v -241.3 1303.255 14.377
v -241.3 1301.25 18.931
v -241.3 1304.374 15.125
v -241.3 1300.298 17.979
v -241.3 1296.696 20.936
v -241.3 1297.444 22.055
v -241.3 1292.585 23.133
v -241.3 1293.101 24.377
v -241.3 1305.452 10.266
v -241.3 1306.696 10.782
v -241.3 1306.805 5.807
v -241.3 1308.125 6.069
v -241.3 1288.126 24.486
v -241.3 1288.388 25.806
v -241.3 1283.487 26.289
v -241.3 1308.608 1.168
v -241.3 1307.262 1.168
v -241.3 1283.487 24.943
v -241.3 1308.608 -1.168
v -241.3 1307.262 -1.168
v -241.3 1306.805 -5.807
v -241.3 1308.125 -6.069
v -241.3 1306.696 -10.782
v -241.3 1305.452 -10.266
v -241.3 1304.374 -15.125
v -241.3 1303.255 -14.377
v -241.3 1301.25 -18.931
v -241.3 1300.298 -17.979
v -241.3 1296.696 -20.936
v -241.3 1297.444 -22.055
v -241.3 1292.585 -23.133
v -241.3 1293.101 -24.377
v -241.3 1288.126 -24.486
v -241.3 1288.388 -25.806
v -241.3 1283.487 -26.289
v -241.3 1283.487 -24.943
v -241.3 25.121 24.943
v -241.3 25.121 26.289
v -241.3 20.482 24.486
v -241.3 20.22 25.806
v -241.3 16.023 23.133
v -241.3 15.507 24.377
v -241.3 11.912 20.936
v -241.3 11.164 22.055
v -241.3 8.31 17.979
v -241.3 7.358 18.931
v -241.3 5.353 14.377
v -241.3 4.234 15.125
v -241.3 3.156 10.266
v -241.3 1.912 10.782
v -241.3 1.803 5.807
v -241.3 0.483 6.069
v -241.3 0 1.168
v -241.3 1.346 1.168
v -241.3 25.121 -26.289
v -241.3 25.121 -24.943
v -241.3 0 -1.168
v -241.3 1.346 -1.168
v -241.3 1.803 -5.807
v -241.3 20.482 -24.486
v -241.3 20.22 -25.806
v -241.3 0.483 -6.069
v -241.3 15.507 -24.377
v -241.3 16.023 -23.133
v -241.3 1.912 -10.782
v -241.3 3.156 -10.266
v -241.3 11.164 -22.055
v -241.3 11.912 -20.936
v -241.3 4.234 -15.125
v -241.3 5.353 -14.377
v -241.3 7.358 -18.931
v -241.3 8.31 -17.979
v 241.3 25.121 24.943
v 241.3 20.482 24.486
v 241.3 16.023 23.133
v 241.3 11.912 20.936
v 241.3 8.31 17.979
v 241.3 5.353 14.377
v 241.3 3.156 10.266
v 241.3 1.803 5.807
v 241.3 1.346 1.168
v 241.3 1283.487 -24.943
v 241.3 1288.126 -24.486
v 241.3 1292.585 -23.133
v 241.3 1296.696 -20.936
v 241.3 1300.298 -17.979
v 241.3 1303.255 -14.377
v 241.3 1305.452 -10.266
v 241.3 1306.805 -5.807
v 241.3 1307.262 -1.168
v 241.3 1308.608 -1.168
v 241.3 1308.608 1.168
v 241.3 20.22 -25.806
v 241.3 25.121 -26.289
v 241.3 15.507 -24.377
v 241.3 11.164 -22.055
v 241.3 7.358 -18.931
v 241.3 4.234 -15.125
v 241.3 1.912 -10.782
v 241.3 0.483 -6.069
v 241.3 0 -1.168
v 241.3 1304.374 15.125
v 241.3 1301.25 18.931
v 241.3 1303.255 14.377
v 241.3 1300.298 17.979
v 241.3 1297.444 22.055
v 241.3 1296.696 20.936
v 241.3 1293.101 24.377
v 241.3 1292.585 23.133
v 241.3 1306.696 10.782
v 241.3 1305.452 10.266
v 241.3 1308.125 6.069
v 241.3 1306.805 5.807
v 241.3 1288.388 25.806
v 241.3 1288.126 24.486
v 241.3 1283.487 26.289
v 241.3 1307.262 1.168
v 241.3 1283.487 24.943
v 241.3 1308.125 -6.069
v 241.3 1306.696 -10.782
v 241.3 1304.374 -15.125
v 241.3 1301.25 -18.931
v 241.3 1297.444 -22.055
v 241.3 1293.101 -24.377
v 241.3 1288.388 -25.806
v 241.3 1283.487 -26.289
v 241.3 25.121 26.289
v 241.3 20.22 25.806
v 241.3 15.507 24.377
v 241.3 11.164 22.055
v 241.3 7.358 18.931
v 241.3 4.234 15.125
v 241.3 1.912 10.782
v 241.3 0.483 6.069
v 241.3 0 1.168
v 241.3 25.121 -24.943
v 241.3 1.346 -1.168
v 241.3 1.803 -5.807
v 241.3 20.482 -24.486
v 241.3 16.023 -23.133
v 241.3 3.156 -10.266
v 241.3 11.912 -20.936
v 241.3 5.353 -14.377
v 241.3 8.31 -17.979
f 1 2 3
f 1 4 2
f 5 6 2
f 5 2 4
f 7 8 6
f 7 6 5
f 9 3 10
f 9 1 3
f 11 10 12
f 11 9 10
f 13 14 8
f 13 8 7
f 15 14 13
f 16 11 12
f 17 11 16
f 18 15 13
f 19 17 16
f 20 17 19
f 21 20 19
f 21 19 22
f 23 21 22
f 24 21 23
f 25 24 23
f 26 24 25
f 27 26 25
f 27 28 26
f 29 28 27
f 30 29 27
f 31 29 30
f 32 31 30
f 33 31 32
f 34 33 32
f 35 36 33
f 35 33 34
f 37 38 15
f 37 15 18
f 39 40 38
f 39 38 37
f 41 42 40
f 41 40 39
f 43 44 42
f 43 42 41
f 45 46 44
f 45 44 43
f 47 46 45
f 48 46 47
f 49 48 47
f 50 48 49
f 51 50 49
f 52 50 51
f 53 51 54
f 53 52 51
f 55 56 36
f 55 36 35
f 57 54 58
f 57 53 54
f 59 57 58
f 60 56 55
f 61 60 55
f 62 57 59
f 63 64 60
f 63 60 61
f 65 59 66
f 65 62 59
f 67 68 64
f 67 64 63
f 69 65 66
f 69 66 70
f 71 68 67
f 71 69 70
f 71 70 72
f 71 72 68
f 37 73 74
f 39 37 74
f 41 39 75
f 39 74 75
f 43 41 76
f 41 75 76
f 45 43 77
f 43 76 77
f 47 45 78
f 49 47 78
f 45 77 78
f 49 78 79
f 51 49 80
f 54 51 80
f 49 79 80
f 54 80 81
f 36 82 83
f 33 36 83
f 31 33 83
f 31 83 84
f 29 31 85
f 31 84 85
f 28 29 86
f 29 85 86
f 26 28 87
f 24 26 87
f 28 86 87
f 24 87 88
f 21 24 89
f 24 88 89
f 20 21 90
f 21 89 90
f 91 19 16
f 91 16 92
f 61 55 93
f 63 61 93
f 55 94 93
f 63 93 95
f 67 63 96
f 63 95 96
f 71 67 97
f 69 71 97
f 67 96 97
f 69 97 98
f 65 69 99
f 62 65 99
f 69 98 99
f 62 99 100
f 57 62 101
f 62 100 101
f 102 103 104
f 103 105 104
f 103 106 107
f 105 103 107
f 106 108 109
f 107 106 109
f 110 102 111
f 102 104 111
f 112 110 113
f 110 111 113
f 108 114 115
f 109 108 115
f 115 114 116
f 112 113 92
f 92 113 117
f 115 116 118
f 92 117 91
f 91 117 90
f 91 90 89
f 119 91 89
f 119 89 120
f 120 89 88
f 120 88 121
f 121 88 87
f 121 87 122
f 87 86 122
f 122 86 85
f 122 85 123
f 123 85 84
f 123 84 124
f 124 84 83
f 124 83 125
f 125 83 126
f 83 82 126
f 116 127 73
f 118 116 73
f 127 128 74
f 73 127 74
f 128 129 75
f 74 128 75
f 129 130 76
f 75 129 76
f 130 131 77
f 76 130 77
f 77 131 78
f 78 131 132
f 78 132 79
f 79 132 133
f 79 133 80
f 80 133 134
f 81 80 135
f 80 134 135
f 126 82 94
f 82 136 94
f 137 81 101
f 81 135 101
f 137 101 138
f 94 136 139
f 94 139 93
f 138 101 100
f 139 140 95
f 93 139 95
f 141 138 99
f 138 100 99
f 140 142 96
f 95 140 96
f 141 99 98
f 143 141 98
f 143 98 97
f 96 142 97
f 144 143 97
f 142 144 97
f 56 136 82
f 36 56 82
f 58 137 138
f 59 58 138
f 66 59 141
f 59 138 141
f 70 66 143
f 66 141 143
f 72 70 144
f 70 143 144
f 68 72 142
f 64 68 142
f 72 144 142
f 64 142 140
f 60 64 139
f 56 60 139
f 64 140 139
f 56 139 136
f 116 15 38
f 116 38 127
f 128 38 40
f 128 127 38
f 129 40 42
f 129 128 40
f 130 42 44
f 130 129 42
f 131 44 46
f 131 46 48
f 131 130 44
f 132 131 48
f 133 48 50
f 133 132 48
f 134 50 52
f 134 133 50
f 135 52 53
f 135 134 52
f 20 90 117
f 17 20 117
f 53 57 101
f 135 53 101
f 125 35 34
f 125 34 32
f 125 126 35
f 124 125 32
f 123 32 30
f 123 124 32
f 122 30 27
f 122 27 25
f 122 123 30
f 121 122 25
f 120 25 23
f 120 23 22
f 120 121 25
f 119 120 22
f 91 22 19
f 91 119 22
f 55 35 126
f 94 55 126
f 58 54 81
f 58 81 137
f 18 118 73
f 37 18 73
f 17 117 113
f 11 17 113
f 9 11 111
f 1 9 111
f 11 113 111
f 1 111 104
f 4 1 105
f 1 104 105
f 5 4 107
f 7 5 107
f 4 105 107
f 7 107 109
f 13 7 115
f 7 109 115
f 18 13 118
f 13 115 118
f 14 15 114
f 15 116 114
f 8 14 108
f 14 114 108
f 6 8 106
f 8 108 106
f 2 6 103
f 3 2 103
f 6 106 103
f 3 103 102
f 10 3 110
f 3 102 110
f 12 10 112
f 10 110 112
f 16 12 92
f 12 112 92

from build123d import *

# Parameters (mm, degrees)
SKETCH1_W           = 482.6
SKETCH1_H           = 52.578
BOSS_EXTRUDE1_DEPTH = 1308.608
FILLET1_R           = 25.1206
CUT_EXTRUDE1_DEPTH  = 483.6


with BuildPart() as part:
    # Sketch1 → Boss-Extrude1 (new body)
    with BuildSketch(Plane(origin=(0, 0, 0), x_dir=(1, 0, 0), z_dir=(0, 1, 0))):
        Rectangle(SKETCH1_W, SKETCH1_H)
    extrude(amount=BOSS_EXTRUDE1_DEPTH)

    # Fillet1
    fillet1_edges = [part.edges().sort_by_distance(p)[0] for p in [
        (0, 1308.608, -26.289),
        (0, 0, -26.289),
        (0, 0, 26.289),
        (0, 1308.608, 26.289),
    ]]
    fillet(fillet1_edges, radius=FILLET1_R)

    # Sketch2 → Cut-Extrude1 (cut, through all)
    with BuildSketch(Plane(origin=(241.3, 0, 0), x_dir=(0, 0, -1), z_dir=(1, 0, 0))):
        with BuildLine():
            Line((24.9428, 25.1206), (24.9428, 1283.4874))
            ThreePointArc((24.9428, 1283.4874), (17.979439459, 1300.298439459), (1.1684, 1307.2618))
            Line((1.1684, 1307.2618), (-1.1684, 1307.2618))
            ThreePointArc((-1.1684, 1307.2618), (-17.979439459, 1300.298439459), (-24.9428, 1283.4874))
            Line((-24.9428, 1283.4874), (-24.9428, 25.1206))
            ThreePointArc((-24.9428, 25.1206), (-17.979439459, 8.309560541), (-1.1684, 1.3462))
            Line((-1.1684, 1.3462), (1.1684, 1.3462))
            ThreePointArc((1.1684, 1.3462), (17.979439459, 8.309560541), (24.9428, 25.1206))
        make_face()
    extrude(amount=-CUT_EXTRUDE1_DEPTH, mode=Mode.SUBTRACT)


solid = part.part
